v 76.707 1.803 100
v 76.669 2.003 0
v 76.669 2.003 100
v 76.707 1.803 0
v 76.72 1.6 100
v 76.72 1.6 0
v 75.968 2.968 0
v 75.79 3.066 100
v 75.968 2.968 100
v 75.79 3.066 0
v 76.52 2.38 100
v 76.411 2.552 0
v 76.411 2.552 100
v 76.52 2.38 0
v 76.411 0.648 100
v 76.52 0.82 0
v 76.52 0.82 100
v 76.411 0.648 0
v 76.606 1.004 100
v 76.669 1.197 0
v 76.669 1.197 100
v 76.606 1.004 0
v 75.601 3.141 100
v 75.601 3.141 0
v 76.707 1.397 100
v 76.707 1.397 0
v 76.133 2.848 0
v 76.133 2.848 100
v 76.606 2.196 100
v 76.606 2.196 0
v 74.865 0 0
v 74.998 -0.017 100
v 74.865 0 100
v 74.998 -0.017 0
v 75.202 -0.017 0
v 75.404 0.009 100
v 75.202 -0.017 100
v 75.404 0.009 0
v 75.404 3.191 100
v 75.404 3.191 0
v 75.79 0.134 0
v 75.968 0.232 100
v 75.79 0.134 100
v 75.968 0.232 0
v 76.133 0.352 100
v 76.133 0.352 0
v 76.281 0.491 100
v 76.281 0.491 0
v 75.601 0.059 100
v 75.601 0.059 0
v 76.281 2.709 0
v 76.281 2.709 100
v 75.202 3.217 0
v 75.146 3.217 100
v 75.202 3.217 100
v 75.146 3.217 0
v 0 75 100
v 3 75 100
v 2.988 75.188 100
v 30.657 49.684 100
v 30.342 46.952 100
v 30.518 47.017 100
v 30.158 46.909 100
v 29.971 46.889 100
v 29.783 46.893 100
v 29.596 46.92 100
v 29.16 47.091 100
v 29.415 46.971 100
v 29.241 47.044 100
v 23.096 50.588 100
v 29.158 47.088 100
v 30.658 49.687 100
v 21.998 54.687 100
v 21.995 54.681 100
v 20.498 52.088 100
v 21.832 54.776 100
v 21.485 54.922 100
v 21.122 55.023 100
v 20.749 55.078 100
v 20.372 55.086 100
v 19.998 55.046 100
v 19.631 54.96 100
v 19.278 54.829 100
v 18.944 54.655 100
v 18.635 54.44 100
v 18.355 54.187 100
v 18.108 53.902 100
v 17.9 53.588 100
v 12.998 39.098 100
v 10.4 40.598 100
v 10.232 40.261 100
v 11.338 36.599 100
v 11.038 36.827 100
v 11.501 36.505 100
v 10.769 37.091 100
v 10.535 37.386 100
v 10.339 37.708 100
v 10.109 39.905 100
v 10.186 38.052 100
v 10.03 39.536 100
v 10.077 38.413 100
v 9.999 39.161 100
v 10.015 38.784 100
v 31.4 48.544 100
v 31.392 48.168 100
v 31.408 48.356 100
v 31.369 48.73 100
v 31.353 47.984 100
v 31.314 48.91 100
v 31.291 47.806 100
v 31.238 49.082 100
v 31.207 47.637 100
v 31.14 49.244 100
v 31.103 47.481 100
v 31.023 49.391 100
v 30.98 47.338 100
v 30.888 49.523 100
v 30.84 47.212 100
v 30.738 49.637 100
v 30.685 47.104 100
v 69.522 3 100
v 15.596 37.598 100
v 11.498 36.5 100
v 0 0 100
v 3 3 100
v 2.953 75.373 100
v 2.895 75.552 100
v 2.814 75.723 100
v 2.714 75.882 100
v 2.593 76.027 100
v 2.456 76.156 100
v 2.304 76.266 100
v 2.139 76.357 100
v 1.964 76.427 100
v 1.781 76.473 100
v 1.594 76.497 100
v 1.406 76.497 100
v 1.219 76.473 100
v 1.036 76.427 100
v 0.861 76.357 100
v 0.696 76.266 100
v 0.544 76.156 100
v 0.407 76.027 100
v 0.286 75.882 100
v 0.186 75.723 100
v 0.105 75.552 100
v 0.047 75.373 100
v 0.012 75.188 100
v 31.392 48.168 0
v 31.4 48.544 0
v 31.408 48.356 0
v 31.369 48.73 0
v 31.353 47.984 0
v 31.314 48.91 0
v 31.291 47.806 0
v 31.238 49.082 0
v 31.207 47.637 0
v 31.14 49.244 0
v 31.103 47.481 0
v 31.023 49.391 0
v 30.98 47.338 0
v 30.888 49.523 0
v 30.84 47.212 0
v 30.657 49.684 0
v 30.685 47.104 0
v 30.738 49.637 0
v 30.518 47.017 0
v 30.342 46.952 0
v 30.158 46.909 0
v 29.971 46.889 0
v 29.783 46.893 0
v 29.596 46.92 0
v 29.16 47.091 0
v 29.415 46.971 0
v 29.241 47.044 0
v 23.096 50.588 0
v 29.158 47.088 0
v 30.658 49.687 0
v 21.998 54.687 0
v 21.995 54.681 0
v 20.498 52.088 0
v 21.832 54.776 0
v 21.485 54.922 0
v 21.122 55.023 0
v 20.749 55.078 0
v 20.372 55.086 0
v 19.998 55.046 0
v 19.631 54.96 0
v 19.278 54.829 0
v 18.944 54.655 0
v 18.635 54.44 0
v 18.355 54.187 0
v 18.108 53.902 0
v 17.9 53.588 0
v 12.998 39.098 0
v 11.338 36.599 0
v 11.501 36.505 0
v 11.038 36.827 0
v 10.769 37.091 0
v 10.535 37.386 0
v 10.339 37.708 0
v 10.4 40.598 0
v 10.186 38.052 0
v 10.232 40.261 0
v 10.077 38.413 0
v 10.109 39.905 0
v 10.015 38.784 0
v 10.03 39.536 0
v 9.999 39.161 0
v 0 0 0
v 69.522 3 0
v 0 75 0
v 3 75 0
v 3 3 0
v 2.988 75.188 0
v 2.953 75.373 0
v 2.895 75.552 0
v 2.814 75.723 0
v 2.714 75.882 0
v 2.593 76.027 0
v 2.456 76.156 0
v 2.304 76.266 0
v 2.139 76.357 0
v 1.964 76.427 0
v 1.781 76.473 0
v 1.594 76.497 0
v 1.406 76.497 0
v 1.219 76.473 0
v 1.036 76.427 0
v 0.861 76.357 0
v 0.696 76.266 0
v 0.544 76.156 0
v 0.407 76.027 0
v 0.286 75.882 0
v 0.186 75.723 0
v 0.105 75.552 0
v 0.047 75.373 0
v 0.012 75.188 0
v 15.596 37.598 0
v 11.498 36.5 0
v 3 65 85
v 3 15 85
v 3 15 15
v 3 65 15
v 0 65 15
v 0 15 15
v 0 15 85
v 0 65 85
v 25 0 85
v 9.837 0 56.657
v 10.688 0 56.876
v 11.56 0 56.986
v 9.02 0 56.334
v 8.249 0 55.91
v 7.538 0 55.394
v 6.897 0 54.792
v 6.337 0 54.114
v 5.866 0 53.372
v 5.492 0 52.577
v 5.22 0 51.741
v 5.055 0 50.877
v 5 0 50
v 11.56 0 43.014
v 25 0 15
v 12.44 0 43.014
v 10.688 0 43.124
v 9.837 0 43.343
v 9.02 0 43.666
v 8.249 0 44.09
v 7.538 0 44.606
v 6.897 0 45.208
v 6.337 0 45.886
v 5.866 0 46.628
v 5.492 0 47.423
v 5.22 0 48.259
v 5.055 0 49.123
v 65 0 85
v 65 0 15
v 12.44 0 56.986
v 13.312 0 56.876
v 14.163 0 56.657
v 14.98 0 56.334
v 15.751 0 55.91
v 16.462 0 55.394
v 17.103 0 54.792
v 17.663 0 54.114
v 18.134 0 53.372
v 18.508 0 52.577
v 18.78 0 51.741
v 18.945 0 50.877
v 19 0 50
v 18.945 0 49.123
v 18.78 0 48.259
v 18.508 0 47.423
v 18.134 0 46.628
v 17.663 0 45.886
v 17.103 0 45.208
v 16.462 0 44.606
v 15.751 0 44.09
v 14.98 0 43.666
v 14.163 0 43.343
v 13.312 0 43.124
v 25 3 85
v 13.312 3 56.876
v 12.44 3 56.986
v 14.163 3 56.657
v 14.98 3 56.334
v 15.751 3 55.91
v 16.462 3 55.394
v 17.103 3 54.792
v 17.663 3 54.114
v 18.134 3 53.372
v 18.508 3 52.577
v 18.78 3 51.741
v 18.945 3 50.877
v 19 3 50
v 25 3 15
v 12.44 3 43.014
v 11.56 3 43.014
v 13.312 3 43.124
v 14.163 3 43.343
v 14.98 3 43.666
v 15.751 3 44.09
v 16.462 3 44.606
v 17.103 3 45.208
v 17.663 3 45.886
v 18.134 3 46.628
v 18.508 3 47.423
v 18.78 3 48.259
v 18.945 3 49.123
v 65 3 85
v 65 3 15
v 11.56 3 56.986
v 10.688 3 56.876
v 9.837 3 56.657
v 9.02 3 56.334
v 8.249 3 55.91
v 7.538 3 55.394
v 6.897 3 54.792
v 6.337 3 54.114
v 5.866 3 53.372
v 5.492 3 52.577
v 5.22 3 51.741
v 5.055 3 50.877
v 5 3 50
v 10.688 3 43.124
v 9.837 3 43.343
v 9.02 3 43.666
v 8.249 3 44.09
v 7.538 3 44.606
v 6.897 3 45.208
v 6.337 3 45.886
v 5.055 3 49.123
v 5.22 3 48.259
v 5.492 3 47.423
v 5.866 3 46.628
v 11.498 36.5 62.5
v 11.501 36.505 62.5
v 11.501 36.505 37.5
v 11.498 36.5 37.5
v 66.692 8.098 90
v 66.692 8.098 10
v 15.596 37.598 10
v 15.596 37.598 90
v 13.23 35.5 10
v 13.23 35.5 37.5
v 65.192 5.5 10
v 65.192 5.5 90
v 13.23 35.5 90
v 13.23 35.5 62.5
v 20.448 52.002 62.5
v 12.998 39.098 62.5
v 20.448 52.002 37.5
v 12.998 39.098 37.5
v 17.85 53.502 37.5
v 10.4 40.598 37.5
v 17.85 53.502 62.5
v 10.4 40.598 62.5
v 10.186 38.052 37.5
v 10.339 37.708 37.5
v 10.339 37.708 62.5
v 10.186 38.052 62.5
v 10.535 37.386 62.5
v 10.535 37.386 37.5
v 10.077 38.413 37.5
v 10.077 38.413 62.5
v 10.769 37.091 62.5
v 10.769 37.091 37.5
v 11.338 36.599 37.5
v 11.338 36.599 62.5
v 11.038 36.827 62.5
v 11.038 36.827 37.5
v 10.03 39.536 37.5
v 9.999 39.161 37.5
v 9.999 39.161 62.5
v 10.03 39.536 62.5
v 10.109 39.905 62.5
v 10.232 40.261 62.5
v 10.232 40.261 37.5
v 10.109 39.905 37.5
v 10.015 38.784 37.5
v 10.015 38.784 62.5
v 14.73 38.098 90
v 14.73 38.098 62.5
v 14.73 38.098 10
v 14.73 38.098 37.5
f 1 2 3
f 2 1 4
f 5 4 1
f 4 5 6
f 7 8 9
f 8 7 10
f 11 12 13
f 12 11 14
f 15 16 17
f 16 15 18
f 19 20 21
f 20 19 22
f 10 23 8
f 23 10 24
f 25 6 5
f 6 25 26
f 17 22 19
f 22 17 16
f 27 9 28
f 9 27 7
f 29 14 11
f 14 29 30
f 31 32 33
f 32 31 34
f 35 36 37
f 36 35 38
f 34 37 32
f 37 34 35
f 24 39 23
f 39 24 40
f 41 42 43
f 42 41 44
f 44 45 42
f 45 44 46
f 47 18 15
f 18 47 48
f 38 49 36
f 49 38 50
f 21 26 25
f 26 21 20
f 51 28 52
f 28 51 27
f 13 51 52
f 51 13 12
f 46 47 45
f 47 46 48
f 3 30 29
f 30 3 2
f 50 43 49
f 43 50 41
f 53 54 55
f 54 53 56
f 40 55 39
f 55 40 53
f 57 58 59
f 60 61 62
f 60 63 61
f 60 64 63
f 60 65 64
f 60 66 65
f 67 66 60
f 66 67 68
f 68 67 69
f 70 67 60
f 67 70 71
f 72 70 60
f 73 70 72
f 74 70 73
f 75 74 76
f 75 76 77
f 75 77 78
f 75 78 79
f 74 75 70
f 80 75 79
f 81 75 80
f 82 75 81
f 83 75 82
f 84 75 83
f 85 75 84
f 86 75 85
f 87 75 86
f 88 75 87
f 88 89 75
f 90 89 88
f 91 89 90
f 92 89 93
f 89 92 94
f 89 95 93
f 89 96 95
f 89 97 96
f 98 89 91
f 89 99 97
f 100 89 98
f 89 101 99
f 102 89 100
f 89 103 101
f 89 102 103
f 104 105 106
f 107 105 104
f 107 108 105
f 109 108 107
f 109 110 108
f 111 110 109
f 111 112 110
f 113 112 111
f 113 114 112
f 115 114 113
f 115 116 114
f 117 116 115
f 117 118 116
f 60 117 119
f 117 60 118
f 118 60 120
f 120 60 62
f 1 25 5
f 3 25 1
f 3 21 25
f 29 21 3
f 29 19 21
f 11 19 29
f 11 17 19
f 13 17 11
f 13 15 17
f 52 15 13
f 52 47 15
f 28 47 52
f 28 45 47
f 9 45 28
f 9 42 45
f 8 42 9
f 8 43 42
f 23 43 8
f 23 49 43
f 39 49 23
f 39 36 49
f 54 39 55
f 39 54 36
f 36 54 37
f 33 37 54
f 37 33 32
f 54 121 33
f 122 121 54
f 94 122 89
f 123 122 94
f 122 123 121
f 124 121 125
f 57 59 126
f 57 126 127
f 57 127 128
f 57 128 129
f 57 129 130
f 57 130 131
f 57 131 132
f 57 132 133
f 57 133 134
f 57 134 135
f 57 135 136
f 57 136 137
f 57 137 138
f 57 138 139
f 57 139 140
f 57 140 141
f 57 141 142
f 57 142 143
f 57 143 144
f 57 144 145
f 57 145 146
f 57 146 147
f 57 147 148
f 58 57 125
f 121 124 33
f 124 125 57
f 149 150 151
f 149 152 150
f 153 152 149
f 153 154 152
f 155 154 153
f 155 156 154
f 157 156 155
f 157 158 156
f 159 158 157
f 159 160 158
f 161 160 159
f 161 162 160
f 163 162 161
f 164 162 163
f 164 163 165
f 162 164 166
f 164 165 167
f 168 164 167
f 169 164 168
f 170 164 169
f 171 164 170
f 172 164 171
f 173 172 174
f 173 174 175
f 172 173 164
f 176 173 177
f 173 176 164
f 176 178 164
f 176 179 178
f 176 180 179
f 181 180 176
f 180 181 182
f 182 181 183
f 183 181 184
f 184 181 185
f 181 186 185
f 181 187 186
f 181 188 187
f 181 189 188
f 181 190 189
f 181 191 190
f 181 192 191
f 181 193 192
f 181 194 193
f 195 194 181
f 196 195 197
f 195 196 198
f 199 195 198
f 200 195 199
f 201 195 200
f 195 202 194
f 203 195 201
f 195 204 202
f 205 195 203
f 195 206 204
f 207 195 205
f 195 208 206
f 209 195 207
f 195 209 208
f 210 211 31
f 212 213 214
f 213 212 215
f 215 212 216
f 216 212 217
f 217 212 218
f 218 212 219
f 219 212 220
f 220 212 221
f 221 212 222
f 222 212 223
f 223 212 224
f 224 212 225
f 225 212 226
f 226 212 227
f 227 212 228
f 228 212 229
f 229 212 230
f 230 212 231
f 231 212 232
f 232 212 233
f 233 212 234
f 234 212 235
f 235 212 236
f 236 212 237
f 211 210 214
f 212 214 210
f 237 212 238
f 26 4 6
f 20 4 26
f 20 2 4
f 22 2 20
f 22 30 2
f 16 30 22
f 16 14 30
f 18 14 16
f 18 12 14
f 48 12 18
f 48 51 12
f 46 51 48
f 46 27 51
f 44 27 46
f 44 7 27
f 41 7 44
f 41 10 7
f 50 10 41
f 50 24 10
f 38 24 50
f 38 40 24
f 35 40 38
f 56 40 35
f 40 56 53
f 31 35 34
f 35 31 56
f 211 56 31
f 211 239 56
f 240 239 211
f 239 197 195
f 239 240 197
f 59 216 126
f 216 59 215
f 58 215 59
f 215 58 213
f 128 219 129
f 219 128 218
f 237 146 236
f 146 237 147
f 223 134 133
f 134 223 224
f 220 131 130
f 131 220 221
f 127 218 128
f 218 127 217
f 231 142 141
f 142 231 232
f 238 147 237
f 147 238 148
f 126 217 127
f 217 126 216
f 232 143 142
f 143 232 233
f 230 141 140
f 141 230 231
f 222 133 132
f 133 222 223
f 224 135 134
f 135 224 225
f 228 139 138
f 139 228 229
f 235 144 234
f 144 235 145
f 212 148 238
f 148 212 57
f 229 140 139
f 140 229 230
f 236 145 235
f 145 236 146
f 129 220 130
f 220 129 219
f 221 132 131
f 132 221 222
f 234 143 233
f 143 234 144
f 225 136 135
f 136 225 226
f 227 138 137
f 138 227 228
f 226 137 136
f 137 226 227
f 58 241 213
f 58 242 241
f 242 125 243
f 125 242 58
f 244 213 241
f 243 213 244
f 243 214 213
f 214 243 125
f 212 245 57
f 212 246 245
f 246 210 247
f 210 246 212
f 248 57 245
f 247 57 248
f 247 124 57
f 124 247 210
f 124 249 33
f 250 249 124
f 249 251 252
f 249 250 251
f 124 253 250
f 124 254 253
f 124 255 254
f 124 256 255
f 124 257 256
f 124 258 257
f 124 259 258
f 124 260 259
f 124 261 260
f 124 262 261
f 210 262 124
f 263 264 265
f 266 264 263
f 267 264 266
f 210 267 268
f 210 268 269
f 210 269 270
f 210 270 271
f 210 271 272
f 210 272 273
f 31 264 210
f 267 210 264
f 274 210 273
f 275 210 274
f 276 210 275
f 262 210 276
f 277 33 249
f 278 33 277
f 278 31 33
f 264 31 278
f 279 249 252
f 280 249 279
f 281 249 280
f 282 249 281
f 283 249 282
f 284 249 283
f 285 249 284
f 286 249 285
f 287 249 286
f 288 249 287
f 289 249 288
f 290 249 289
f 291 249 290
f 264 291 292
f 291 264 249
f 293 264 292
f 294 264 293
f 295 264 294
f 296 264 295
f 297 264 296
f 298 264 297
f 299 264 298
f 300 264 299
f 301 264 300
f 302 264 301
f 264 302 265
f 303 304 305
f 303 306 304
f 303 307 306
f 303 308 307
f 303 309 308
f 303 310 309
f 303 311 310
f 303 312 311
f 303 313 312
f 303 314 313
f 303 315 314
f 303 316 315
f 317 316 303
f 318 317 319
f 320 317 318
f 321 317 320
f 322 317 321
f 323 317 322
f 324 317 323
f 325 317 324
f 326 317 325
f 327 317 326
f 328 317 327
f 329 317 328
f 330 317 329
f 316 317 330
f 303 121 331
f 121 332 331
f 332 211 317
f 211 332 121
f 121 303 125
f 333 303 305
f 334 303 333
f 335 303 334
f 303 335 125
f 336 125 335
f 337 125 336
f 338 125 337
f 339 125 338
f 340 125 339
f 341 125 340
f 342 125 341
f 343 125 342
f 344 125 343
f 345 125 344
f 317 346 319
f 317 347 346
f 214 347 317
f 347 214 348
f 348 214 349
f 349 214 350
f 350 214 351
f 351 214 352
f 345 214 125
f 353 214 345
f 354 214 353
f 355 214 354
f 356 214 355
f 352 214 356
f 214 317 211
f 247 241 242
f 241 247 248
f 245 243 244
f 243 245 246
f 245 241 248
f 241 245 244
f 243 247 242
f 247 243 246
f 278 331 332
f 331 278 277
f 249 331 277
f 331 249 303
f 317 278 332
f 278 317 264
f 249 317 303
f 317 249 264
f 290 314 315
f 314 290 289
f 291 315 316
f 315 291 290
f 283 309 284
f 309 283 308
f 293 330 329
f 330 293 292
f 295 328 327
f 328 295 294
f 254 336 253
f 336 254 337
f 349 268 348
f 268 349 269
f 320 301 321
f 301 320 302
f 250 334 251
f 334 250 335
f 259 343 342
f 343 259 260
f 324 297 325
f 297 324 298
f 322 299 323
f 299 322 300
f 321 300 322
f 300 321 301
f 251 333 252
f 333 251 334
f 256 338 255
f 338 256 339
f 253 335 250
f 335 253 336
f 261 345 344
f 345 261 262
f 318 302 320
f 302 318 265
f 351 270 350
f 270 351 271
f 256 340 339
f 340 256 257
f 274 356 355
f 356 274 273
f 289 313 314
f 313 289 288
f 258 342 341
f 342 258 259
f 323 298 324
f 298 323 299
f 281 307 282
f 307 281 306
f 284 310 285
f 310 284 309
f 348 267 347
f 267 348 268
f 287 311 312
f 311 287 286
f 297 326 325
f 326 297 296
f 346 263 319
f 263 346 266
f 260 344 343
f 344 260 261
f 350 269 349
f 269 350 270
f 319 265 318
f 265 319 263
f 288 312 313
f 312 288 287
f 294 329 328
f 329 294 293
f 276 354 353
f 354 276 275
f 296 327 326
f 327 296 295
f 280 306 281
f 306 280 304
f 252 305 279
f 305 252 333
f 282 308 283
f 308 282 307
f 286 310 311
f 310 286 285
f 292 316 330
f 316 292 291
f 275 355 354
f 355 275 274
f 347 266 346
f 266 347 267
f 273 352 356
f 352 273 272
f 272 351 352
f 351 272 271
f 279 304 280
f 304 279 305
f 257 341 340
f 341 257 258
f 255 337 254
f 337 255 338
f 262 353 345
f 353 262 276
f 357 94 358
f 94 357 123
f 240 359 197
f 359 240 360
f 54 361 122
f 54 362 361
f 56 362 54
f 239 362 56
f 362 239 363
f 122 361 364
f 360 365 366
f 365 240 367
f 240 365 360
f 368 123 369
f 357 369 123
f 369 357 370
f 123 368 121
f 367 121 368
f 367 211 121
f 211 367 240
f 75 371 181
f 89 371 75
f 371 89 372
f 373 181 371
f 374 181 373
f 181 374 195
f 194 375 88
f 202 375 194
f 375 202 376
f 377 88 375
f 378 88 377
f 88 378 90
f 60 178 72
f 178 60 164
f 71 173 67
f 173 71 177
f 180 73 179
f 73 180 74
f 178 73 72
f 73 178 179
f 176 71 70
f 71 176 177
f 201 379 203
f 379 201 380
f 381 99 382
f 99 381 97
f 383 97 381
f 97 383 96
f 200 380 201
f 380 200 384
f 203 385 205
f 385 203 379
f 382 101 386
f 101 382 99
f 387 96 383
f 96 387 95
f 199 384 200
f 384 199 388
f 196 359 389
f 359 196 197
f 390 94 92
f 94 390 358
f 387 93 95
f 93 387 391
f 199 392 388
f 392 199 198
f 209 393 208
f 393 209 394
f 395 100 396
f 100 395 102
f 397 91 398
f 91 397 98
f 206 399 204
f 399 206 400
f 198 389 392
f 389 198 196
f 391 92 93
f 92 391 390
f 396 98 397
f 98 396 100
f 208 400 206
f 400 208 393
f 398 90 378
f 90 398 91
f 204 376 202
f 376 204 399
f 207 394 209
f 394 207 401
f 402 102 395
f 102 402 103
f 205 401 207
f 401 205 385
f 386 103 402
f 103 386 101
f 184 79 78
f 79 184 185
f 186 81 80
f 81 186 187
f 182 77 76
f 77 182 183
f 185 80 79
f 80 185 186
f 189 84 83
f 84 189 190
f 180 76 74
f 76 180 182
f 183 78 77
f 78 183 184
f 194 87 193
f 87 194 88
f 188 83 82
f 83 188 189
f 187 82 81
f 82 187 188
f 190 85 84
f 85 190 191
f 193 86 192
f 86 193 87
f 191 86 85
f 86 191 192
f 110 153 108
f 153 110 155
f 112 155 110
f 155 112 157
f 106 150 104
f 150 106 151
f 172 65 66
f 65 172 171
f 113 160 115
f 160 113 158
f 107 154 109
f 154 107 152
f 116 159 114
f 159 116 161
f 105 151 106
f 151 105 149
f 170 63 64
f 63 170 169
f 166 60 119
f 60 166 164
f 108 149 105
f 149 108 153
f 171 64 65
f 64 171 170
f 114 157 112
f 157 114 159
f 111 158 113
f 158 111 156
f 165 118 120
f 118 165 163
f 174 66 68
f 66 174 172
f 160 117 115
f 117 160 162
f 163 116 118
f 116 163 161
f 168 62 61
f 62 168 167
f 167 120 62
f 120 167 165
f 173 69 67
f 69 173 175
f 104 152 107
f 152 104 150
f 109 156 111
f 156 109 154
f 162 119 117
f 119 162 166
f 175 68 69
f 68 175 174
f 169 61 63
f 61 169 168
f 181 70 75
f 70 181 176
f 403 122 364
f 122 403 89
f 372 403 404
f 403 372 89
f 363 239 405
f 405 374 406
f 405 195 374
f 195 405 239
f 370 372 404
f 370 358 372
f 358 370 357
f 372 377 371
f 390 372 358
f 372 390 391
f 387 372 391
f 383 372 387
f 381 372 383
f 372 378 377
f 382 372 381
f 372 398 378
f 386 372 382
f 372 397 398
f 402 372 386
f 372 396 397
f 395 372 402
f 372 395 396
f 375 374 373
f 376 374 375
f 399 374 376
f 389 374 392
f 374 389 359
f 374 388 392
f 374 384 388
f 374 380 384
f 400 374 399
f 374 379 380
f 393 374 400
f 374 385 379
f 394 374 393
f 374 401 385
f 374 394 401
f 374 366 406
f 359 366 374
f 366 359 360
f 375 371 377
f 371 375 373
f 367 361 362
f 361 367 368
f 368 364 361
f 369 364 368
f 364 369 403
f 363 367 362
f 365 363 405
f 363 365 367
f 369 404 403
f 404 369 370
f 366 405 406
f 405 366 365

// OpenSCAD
$fn=50;

        difference()  // Back and bottom
        { 
            union()
            {
                translate([75.1,1.6,0])
                cylinder(100,1.62,1.62);
                translate([1.5,75,0])
                cylinder(100,1.5,1.5);
                cube([3,75,100]);
                cube([75,3,100]);
            }
            union()
            {
                translate([-0.1,15,15])
                cube([3.2,50,70]);
                translate([25.,-0.1,15])
                cube([40,3.2,70]); 
                translate([12,3.1,50])
                rotate([90,0,0])
                cylinder(3.2,7,7,center=false);
            }
        }
        
        translate([8.9,38,0])
        rotate([0,0,-30])
        difference()
        {
            union()
            {
                translate([3,0,0])
                cube([72,3,100]);
                translate([0,3,0])
                cube([3,15,100]);
                translate([3,18,0])
                cube([10,3,100]);
                translate([3,3,0])
                cylinder(100,3,3);
                translate([3,18,0])
                cylinder(100,3,3);
                translate([13,19.5,0])
                cylinder(100,1.5,1.5);
            }
            union()
            {
                translate([3,3,-0.1])
                    cube([3,15,100.2]);
                translate([-0.4,-0.1,37.5])
                    cube([10,18,25]);
                translate([5,-0.1,10])
                    cube([60,3.2,80]);
            }    
        }
